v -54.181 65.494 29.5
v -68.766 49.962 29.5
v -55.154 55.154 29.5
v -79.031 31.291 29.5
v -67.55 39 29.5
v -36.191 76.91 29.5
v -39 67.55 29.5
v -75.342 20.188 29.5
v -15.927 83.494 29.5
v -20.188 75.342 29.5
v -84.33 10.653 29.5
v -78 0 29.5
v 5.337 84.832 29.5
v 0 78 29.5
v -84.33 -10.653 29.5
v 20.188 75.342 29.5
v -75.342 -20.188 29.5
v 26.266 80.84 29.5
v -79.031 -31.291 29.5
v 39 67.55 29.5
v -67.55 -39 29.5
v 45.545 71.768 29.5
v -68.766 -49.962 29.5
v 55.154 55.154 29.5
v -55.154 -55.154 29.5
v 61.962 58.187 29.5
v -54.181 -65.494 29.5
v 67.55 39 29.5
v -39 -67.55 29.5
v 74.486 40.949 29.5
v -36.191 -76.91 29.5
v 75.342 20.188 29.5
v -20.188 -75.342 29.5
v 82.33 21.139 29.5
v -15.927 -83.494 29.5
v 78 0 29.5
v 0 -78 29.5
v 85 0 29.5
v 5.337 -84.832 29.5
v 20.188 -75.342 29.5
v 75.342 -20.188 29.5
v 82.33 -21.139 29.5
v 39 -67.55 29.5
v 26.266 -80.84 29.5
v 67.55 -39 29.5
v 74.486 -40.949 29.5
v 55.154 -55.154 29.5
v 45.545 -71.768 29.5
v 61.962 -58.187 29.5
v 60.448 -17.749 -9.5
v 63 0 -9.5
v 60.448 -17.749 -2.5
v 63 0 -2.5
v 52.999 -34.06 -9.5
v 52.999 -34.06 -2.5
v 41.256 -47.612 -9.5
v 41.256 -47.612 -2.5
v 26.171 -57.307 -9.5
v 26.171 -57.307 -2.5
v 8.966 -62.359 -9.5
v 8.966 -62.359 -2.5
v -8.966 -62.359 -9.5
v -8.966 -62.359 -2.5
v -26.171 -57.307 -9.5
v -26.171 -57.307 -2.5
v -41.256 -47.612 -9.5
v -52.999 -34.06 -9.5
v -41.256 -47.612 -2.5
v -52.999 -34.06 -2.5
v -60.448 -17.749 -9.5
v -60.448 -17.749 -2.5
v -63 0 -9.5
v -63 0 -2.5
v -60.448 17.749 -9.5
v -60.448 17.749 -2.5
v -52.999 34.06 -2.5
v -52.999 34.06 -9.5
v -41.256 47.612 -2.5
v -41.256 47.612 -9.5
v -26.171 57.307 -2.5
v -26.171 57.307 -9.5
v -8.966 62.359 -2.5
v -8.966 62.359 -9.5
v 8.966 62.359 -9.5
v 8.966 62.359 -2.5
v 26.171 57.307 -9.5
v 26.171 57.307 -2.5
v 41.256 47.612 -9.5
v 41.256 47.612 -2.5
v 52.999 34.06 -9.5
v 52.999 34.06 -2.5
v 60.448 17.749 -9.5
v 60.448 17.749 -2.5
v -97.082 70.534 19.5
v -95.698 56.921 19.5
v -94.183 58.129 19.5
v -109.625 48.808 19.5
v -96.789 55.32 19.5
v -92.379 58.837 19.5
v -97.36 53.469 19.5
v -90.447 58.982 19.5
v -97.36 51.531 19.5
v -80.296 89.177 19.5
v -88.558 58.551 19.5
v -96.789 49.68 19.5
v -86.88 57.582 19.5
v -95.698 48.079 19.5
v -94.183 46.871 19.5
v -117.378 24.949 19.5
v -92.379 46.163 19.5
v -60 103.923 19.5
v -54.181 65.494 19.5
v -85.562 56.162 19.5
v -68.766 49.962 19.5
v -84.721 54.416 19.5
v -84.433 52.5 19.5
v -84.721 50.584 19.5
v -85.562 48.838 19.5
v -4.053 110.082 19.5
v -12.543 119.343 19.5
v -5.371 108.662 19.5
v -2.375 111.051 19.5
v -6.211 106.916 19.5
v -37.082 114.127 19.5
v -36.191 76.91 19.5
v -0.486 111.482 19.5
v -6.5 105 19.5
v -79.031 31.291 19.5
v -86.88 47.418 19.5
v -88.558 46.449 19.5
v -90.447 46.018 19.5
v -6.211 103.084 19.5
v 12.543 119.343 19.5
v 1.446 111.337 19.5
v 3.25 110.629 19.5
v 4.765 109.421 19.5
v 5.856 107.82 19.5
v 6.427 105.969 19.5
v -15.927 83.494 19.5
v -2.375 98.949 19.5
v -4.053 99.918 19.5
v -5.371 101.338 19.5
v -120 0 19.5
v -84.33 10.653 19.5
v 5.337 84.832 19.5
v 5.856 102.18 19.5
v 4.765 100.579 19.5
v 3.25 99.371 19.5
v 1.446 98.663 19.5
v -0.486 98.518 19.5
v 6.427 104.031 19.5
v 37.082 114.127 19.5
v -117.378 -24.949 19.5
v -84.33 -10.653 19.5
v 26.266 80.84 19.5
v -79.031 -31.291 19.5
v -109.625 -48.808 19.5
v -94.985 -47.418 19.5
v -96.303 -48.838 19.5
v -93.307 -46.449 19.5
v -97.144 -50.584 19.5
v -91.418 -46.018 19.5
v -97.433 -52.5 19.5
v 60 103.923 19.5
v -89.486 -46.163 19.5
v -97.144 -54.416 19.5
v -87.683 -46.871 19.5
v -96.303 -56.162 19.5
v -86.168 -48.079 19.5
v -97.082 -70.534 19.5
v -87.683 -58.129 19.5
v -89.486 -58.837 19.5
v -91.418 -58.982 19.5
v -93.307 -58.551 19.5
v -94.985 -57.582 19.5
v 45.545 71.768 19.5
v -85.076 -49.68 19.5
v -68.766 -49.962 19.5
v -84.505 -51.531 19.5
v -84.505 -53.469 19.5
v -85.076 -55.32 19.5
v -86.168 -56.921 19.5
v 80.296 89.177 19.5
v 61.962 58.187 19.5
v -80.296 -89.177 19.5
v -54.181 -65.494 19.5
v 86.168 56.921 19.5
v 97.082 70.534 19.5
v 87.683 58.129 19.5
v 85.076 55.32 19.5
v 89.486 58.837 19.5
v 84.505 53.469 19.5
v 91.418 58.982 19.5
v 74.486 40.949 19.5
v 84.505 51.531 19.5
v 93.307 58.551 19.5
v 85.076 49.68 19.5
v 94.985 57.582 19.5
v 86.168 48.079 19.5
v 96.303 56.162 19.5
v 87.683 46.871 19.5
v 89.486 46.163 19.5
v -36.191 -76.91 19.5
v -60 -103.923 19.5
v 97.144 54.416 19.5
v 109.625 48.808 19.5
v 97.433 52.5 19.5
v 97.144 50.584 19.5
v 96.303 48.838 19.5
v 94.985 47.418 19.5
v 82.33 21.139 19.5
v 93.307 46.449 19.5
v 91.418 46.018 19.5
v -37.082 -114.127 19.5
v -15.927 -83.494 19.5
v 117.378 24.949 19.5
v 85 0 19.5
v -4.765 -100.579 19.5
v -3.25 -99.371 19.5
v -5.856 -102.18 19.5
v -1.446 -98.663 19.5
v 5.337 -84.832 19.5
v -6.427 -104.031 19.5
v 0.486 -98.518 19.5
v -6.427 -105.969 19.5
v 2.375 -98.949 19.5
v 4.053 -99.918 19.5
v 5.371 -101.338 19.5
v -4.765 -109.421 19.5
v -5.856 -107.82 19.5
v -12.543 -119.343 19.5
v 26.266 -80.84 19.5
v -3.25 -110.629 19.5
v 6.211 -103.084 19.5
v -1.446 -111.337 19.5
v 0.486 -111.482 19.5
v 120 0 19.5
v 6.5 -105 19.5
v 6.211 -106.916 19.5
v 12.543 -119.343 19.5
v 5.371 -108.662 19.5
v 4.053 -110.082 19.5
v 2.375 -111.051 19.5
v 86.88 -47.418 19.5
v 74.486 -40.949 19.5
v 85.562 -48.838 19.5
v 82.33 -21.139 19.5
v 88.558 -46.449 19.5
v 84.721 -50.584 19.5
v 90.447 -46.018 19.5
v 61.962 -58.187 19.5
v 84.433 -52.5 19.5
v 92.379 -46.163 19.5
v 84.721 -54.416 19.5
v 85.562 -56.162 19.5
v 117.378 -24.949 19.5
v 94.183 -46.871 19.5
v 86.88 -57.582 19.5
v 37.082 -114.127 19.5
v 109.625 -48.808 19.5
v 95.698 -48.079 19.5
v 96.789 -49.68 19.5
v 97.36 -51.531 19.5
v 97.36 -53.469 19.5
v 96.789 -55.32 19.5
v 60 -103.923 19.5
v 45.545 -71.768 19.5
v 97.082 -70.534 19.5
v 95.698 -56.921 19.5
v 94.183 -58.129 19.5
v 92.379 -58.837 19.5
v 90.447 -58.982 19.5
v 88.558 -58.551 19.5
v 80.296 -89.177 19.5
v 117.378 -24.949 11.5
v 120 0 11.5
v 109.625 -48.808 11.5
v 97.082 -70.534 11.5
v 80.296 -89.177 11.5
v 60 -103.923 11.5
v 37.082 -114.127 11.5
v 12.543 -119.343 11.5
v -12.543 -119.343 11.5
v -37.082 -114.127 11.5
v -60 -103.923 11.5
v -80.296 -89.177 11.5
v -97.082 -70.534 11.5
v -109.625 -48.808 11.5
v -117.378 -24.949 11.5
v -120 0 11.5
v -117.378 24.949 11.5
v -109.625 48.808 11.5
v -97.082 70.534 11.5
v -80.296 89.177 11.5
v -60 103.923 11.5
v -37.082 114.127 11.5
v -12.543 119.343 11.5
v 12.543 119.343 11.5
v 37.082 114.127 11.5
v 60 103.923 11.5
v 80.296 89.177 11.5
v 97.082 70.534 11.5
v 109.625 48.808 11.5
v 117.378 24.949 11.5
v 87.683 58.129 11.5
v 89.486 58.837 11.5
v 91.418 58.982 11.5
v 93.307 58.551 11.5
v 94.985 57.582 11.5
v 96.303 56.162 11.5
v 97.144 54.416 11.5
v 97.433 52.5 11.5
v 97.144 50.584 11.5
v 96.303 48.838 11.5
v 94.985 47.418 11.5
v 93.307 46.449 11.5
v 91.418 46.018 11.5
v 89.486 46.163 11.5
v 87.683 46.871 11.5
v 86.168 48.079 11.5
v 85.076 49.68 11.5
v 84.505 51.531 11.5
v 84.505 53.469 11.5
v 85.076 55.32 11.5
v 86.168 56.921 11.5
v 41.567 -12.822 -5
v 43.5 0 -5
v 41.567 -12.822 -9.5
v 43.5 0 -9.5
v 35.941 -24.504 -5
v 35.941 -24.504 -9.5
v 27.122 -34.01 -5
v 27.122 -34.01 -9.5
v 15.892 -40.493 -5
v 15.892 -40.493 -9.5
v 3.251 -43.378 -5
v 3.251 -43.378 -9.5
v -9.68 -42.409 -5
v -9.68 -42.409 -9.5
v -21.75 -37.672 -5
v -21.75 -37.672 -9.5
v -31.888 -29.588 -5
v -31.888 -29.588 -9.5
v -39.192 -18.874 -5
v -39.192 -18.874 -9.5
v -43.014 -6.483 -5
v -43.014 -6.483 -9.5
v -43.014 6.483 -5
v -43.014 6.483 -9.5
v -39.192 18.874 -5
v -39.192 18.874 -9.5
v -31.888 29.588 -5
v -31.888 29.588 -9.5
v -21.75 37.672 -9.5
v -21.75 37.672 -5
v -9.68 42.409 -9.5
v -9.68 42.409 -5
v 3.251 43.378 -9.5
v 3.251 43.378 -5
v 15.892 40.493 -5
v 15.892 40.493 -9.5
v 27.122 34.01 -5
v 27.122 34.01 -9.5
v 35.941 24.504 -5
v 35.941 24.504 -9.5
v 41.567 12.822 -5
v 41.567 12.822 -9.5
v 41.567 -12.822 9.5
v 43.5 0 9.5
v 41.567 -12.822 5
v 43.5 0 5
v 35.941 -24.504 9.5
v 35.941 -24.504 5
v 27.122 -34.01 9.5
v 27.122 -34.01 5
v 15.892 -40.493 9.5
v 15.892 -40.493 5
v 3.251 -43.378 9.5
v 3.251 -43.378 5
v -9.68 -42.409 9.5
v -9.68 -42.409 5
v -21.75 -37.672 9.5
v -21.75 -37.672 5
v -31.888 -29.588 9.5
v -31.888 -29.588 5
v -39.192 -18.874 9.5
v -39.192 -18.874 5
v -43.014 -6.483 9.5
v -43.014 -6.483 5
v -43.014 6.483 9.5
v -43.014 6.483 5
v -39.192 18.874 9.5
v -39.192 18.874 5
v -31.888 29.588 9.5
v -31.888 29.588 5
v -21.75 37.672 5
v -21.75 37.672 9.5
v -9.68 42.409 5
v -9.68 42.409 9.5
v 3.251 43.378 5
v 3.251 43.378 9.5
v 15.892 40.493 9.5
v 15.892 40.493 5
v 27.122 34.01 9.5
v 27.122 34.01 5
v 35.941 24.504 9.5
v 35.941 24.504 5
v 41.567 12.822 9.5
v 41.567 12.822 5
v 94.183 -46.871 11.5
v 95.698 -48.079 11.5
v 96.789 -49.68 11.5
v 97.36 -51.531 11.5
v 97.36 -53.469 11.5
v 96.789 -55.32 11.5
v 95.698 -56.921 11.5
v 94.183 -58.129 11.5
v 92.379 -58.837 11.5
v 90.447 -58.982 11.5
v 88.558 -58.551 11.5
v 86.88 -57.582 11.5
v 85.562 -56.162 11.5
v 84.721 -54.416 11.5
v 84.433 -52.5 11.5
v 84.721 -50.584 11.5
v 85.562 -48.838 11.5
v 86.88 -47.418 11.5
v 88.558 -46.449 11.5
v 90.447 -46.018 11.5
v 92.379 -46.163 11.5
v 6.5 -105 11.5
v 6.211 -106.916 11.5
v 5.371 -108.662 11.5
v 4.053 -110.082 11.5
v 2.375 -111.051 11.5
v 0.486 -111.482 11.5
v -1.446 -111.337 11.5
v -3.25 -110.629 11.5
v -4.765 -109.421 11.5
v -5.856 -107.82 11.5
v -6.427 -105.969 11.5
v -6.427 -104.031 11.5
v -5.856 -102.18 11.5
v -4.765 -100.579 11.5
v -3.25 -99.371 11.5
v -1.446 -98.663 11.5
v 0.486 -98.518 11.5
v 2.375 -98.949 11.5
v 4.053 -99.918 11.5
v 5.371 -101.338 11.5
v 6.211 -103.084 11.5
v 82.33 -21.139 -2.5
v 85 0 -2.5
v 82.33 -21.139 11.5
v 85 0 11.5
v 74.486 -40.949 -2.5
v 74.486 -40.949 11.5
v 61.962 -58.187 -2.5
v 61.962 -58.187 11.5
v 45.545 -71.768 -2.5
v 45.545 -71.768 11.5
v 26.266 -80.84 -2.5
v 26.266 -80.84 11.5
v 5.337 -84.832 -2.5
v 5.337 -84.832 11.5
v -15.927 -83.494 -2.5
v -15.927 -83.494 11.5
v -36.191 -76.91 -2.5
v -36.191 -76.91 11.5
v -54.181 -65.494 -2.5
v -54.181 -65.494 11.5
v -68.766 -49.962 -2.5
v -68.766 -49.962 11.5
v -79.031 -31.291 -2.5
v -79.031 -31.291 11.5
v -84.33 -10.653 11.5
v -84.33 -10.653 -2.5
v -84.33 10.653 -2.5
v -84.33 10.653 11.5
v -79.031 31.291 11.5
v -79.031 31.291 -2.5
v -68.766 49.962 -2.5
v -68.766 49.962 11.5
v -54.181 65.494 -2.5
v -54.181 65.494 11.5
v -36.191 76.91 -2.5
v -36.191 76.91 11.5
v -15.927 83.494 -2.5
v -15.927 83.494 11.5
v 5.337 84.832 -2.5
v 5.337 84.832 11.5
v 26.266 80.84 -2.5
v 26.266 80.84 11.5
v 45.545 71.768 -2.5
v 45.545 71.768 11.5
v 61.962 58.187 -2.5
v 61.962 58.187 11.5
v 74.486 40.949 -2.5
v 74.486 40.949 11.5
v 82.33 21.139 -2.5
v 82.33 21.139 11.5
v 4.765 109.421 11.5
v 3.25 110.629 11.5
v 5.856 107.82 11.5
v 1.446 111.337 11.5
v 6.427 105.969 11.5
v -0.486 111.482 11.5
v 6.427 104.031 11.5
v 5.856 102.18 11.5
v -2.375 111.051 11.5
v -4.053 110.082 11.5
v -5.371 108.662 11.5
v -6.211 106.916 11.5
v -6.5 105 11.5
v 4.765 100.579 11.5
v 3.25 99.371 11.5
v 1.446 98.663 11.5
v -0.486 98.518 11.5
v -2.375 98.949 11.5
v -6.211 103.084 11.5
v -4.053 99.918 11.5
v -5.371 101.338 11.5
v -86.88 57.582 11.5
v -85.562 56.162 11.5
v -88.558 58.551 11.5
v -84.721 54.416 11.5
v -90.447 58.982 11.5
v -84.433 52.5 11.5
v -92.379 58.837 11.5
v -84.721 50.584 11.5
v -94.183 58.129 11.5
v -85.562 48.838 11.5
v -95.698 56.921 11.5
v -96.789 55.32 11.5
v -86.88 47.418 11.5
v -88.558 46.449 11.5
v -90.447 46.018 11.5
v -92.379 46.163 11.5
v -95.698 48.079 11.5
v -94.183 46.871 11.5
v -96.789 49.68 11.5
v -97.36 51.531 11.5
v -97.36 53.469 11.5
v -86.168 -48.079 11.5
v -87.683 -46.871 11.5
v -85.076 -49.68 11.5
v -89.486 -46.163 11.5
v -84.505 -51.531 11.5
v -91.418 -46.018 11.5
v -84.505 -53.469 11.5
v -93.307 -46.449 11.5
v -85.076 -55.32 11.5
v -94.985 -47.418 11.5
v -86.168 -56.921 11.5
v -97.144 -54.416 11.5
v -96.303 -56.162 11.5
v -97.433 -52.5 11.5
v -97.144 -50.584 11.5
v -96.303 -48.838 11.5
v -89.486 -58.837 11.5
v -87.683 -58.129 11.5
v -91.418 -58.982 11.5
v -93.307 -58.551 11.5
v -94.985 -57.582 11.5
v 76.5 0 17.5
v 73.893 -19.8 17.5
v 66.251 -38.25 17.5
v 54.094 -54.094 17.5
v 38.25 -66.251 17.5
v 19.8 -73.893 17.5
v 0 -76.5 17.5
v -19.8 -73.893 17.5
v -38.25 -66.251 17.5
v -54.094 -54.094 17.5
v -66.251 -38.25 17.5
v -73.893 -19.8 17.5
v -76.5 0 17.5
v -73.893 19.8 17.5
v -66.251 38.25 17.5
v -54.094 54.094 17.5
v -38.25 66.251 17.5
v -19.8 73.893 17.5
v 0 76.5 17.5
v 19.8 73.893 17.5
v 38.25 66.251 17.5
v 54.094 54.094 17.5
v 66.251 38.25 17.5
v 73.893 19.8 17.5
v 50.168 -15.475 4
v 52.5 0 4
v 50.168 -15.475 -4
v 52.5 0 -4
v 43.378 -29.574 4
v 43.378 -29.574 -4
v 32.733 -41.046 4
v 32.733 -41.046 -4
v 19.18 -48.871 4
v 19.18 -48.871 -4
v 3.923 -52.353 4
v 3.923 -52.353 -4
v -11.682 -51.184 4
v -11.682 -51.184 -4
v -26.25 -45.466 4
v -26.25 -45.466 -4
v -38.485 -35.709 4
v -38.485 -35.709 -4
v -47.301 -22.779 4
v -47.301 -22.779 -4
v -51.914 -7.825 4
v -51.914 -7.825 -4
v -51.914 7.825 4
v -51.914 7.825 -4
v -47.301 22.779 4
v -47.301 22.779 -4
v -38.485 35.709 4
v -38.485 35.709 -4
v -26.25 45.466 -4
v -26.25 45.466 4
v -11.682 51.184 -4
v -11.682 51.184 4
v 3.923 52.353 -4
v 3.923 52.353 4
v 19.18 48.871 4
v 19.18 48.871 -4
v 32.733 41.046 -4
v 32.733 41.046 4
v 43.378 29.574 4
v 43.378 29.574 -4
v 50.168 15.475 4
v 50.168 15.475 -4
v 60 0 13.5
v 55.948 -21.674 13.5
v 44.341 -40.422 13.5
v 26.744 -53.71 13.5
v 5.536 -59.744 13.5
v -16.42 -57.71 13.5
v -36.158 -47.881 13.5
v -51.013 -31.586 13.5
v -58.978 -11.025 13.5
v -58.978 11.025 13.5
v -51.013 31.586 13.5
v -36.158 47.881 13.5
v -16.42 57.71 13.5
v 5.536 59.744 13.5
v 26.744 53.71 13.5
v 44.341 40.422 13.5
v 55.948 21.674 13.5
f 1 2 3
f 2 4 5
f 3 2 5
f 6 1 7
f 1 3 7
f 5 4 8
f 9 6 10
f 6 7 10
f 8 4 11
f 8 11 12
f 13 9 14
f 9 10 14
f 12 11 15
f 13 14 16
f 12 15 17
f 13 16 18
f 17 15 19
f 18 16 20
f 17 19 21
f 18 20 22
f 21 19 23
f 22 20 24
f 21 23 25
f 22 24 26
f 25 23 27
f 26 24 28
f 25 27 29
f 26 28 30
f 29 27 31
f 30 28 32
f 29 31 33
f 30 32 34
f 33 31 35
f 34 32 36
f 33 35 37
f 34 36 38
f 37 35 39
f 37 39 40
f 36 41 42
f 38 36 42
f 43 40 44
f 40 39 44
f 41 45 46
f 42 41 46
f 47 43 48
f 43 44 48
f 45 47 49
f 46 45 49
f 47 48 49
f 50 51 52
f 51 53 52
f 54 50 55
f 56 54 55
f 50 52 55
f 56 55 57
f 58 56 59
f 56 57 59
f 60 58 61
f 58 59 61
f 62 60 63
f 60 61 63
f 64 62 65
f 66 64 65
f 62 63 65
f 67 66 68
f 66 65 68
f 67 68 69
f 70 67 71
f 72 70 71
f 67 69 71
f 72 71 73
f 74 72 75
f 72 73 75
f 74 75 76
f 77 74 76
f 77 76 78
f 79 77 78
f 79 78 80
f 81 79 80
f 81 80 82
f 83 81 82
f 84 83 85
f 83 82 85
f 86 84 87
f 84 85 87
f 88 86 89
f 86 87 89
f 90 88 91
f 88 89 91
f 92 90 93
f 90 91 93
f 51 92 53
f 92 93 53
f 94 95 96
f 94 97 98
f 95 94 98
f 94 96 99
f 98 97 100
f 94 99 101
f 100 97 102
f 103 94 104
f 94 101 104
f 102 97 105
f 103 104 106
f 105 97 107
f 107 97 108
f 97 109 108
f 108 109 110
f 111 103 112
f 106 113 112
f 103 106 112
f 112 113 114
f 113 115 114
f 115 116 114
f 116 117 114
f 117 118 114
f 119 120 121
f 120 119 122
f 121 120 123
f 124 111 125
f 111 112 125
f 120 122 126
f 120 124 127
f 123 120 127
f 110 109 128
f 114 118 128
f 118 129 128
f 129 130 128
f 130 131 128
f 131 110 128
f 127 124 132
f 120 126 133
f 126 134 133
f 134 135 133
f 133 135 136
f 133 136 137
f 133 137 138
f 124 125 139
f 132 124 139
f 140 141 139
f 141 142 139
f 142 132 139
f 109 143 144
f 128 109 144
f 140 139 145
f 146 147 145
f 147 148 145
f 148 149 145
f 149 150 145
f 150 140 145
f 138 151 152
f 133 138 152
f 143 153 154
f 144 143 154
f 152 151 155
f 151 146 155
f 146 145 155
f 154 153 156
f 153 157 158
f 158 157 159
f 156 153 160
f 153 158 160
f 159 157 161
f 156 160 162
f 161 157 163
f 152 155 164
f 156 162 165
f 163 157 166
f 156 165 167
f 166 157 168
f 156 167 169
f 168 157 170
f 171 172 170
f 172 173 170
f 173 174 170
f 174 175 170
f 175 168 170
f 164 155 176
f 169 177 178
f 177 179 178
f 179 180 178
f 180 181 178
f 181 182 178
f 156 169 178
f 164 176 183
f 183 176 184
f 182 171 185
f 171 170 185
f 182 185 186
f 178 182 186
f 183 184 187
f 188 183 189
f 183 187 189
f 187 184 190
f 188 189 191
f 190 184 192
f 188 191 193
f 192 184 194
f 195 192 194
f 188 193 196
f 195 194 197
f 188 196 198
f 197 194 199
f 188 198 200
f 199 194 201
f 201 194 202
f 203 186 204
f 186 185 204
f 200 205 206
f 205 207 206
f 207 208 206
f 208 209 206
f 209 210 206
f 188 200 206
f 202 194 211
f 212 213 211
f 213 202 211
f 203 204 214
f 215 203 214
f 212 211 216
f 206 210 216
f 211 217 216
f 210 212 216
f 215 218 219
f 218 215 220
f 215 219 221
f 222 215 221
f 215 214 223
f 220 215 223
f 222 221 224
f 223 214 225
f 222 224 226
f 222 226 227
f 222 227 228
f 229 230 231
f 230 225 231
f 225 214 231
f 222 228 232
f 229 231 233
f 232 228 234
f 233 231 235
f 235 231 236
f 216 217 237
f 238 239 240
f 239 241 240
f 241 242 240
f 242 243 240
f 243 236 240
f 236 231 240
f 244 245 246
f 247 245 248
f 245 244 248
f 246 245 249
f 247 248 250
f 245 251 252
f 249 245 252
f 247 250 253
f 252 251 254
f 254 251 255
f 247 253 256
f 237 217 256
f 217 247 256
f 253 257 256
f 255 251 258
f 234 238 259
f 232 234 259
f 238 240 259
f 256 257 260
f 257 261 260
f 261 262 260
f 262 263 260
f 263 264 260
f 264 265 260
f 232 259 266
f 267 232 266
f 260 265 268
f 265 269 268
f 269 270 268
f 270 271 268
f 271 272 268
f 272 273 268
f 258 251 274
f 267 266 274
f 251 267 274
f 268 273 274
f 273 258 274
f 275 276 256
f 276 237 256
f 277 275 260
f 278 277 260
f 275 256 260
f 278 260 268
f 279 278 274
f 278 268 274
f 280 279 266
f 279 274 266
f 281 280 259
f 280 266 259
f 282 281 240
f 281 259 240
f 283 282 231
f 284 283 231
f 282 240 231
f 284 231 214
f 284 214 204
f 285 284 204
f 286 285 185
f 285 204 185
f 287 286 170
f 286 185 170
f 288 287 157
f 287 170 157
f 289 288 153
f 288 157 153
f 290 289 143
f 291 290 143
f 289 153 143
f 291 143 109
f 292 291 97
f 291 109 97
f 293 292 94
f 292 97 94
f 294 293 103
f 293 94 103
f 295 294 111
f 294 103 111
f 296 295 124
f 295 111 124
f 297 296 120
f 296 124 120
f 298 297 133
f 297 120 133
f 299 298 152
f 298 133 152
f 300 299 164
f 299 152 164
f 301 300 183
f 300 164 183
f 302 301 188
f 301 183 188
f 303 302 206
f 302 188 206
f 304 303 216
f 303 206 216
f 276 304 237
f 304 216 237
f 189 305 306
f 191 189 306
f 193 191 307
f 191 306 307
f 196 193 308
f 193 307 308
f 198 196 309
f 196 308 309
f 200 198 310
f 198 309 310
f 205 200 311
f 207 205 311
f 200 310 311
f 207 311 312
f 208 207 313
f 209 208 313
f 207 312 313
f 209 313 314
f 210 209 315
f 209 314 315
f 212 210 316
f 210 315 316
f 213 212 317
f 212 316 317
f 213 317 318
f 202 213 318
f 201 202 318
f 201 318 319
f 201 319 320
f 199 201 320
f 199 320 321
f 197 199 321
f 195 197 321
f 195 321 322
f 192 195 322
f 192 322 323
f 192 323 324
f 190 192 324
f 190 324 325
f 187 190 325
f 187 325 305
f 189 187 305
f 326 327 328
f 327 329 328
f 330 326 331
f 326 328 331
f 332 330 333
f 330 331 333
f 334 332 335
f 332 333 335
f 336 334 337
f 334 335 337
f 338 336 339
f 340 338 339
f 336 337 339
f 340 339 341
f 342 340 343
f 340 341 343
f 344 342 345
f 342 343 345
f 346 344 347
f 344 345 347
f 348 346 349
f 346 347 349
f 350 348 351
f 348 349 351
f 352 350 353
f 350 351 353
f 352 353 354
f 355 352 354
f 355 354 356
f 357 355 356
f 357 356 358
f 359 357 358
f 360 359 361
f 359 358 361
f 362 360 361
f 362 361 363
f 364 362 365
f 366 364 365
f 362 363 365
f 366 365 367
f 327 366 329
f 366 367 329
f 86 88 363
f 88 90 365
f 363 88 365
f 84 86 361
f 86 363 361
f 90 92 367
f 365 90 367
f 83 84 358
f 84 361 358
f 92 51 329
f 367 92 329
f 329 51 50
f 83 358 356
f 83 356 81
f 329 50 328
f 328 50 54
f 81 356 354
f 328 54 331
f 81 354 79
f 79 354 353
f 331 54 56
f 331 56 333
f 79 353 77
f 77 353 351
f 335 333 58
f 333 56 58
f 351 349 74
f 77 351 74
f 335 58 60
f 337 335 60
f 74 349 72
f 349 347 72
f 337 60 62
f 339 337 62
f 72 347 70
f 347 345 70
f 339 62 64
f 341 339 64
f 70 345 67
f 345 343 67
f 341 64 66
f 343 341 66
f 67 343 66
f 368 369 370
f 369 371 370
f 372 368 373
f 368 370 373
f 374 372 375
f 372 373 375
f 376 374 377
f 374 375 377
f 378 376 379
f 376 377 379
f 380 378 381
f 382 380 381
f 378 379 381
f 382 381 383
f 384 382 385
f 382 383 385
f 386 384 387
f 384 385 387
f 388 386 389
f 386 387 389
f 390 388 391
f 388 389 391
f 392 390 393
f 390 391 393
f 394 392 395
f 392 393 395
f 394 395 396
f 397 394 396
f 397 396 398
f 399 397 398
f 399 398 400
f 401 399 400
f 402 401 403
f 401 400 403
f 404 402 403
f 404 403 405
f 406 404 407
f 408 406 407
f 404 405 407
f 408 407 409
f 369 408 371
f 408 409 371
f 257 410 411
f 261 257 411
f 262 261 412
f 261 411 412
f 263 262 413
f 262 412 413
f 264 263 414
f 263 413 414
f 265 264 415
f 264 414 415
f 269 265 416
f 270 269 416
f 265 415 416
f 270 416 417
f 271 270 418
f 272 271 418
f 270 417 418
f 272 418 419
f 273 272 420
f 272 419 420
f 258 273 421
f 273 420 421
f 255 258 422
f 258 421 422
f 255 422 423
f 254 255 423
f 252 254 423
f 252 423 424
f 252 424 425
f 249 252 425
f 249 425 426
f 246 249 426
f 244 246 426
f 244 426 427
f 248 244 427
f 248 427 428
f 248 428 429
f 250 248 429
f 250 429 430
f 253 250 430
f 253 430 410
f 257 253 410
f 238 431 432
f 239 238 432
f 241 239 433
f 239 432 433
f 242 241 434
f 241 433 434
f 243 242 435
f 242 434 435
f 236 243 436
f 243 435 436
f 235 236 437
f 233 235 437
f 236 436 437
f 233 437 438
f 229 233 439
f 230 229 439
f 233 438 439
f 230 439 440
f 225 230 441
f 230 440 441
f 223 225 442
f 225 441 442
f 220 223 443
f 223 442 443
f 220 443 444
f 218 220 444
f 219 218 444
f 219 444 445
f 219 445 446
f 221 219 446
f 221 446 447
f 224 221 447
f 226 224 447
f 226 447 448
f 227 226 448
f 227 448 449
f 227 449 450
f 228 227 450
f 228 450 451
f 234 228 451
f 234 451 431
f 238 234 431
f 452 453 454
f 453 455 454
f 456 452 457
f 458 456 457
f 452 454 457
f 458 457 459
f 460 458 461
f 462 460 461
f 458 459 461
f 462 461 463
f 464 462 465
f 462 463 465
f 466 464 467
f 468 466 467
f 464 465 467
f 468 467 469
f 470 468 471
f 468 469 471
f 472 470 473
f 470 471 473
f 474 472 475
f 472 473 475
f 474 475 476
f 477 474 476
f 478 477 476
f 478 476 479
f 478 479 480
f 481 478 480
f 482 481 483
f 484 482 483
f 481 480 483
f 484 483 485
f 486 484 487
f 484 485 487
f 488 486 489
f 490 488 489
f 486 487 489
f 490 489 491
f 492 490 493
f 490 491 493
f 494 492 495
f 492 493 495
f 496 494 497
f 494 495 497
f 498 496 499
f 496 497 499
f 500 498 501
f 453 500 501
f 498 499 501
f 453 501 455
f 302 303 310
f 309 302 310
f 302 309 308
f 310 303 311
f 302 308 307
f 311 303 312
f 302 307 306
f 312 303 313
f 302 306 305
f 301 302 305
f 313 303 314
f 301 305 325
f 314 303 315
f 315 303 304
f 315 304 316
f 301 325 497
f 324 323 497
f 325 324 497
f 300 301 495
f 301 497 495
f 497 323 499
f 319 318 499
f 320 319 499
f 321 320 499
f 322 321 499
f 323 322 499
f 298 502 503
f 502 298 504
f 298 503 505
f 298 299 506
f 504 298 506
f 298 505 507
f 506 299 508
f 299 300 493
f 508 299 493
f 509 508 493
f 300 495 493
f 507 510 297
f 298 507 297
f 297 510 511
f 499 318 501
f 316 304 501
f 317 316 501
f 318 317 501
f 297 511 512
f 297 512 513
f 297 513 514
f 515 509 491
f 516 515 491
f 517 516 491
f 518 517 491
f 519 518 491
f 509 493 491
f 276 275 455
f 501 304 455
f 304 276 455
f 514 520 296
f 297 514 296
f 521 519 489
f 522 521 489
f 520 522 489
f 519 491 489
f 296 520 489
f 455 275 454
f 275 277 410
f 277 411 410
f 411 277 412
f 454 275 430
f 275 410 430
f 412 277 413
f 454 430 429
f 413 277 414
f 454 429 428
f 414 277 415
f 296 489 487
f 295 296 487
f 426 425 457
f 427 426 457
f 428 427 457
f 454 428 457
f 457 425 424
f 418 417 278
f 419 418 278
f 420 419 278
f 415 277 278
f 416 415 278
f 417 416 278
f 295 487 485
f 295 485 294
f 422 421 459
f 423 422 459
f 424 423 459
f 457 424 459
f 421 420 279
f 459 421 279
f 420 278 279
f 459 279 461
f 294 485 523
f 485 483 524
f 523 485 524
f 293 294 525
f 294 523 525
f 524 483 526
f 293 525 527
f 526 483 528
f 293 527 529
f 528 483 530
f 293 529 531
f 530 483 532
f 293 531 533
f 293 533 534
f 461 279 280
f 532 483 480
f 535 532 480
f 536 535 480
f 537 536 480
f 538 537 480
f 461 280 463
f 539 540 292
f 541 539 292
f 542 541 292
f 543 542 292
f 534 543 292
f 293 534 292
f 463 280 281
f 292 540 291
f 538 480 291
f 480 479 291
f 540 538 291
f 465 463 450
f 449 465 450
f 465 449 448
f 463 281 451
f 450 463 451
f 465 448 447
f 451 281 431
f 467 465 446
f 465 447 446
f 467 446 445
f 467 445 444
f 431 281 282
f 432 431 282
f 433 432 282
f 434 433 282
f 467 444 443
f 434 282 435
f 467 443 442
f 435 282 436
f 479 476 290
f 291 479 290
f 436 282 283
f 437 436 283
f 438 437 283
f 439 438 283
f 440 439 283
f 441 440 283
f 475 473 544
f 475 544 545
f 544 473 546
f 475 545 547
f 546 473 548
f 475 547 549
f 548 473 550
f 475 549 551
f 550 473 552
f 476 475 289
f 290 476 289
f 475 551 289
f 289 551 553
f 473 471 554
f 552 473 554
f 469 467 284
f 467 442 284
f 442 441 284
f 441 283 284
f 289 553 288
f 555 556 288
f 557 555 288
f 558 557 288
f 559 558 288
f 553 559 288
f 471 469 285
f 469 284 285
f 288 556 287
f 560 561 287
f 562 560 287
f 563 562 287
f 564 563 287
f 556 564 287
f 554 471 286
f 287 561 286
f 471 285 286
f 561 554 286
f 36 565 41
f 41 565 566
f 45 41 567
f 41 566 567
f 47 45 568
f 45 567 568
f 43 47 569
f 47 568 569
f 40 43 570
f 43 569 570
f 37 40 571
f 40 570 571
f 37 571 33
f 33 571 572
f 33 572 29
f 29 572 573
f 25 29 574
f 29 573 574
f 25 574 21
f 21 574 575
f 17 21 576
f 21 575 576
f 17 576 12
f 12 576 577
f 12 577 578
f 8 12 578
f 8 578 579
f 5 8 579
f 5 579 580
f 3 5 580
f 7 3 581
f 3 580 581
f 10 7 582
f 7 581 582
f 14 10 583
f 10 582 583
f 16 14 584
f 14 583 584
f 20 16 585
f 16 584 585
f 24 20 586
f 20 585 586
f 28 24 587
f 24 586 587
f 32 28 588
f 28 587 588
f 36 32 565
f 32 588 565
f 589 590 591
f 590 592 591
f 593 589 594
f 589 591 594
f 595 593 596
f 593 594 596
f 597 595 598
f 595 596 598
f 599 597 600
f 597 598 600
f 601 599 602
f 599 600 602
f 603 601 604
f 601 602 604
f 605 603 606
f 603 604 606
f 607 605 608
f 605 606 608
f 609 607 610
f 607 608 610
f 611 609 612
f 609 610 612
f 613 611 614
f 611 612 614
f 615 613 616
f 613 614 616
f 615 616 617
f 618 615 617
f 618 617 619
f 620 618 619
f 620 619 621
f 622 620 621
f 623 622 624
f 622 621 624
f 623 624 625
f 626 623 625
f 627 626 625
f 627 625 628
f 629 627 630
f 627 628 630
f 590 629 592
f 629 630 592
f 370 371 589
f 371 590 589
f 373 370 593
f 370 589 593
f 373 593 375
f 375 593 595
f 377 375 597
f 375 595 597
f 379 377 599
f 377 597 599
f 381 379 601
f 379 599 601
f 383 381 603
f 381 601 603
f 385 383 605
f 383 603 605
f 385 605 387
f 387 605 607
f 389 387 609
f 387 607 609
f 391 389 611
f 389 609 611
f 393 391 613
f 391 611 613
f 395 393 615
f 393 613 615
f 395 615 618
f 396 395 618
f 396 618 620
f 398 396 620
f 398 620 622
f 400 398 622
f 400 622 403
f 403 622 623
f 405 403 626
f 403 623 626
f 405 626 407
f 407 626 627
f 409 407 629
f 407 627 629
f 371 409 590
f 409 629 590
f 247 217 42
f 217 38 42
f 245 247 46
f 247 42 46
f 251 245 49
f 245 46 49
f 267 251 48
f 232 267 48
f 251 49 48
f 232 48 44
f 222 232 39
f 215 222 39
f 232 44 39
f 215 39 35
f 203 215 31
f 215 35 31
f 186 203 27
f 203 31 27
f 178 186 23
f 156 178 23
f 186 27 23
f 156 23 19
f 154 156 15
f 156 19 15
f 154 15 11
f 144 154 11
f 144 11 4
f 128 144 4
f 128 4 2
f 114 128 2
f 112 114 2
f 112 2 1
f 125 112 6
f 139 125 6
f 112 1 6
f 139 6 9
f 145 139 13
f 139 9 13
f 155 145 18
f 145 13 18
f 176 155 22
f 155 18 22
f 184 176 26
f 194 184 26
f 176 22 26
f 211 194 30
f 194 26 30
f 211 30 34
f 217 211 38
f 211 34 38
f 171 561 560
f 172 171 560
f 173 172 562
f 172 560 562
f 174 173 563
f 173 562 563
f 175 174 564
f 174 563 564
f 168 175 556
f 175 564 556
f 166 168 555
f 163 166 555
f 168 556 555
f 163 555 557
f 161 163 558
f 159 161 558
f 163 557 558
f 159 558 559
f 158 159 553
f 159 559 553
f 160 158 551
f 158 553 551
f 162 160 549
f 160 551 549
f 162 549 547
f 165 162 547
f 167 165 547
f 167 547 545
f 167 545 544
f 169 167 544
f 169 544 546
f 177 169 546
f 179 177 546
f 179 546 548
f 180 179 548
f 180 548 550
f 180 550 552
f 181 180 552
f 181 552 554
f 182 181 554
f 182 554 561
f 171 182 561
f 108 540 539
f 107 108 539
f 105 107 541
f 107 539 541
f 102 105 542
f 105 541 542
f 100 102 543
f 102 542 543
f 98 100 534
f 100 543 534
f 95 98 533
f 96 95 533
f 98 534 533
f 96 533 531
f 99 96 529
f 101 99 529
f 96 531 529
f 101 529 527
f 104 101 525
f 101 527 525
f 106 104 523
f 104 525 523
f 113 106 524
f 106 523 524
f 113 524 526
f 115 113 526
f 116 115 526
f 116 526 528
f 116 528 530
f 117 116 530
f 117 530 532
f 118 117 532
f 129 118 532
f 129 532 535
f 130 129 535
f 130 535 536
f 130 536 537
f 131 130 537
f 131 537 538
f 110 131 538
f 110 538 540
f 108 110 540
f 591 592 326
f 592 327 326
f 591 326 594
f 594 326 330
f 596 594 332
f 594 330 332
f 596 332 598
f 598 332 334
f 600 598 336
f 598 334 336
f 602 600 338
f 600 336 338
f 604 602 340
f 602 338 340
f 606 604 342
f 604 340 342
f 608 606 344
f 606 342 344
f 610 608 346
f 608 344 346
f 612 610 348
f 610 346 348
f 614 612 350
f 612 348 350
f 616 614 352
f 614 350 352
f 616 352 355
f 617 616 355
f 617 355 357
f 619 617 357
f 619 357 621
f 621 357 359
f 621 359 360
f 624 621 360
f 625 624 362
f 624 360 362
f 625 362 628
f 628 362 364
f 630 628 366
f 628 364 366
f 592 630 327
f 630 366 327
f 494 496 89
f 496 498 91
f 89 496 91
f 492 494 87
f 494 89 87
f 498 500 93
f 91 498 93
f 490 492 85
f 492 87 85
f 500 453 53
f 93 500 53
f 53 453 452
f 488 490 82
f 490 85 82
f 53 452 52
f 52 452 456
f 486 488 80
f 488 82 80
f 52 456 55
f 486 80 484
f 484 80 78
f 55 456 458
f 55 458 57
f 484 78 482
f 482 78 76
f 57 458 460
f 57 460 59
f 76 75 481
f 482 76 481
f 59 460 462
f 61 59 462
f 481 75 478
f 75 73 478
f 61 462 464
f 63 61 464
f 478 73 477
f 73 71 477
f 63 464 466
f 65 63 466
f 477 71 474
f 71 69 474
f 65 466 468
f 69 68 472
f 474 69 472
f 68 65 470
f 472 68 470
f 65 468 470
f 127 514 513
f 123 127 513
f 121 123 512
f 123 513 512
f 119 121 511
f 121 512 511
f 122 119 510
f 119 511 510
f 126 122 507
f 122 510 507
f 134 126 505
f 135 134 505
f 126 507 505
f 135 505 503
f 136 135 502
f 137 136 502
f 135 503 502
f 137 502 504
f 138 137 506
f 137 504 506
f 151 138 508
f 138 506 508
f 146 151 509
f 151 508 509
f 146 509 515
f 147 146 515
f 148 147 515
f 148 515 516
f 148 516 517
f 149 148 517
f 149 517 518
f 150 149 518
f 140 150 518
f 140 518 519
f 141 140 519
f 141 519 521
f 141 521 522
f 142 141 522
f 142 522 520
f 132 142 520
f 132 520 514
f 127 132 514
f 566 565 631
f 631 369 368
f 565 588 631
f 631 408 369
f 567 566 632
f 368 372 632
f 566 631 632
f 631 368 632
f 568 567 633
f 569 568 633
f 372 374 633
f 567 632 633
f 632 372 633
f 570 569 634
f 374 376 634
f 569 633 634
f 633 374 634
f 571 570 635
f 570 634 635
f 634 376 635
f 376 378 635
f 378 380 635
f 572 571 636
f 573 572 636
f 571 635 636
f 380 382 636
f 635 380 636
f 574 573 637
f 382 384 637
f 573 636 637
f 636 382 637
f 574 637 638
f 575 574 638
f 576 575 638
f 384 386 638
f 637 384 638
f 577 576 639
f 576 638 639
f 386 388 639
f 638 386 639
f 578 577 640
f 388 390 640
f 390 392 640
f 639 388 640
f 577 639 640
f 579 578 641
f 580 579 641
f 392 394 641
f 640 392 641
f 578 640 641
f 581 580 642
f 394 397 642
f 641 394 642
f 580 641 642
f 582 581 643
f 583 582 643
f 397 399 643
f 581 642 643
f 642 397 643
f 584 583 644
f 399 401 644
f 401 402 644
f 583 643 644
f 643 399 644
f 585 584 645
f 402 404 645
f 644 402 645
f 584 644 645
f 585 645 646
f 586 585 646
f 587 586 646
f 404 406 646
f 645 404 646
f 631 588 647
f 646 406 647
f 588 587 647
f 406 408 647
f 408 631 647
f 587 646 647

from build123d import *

# Parameters (mm, degrees)
SKETCH_2_R               = 6.5
CUT_EXTRUDE_1_DEPTH      = 172
PATTERN_CIRCULAR_1_COUNT = 6


with BuildPart() as part:
    # 草图1 → 旋转1 (revolve)
    with BuildSketch(Plane(origin=(0, 0, 0), x_dir=(0, 0, -1), z_dir=(1, 0, 0)), mode=Mode.PRIVATE) as revolve_1_sk:
        Polygon((-9.5, 43.5), (-5, 43.5), (-4, 52.5), (4, 52.5), (5, 43.5), (9.5, 43.5), (9.5, 63), (2.5, 63), (2.5, 85), (-11.5, 85), (-11.5, 120), (-19.5, 120), (-19.5, 85), (-29.5, 85), (-29.5, 78), (-17.5, 76.5), align=None)
    revolve(revolve_1_sk.sketch.rotate(Axis((0, 0, 1000), (0, 0, -1)), 90), axis=Axis((0, 0, 1000), (0, 0, -1)))

    # 草图2 → 切除-拉伸1 (cut, through all)
    with BuildSketch(Plane(origin=(0, 0, 11.5), x_dir=(-1, 0, 0), z_dir=(0, 0, -1))):
        with Locations((0, 105)):
            Circle(SKETCH_2_R)
    cut_extrude_1 = extrude(amount=-CUT_EXTRUDE_1_DEPTH, mode=Mode.SUBTRACT)

    # 阵列(圆周)1: 切除-拉伸1 ×6 about axis
    pattern_circular_1_axis = Axis((0, 0, 0), (0, 0, 1))
    for i in range(1, PATTERN_CIRCULAR_1_COUNT):
        add(cut_extrude_1.rotate(pattern_circular_1_axis, i * 360 / PATTERN_CIRCULAR_1_COUNT), mode=Mode.SUBTRACT)


solid = part.part
